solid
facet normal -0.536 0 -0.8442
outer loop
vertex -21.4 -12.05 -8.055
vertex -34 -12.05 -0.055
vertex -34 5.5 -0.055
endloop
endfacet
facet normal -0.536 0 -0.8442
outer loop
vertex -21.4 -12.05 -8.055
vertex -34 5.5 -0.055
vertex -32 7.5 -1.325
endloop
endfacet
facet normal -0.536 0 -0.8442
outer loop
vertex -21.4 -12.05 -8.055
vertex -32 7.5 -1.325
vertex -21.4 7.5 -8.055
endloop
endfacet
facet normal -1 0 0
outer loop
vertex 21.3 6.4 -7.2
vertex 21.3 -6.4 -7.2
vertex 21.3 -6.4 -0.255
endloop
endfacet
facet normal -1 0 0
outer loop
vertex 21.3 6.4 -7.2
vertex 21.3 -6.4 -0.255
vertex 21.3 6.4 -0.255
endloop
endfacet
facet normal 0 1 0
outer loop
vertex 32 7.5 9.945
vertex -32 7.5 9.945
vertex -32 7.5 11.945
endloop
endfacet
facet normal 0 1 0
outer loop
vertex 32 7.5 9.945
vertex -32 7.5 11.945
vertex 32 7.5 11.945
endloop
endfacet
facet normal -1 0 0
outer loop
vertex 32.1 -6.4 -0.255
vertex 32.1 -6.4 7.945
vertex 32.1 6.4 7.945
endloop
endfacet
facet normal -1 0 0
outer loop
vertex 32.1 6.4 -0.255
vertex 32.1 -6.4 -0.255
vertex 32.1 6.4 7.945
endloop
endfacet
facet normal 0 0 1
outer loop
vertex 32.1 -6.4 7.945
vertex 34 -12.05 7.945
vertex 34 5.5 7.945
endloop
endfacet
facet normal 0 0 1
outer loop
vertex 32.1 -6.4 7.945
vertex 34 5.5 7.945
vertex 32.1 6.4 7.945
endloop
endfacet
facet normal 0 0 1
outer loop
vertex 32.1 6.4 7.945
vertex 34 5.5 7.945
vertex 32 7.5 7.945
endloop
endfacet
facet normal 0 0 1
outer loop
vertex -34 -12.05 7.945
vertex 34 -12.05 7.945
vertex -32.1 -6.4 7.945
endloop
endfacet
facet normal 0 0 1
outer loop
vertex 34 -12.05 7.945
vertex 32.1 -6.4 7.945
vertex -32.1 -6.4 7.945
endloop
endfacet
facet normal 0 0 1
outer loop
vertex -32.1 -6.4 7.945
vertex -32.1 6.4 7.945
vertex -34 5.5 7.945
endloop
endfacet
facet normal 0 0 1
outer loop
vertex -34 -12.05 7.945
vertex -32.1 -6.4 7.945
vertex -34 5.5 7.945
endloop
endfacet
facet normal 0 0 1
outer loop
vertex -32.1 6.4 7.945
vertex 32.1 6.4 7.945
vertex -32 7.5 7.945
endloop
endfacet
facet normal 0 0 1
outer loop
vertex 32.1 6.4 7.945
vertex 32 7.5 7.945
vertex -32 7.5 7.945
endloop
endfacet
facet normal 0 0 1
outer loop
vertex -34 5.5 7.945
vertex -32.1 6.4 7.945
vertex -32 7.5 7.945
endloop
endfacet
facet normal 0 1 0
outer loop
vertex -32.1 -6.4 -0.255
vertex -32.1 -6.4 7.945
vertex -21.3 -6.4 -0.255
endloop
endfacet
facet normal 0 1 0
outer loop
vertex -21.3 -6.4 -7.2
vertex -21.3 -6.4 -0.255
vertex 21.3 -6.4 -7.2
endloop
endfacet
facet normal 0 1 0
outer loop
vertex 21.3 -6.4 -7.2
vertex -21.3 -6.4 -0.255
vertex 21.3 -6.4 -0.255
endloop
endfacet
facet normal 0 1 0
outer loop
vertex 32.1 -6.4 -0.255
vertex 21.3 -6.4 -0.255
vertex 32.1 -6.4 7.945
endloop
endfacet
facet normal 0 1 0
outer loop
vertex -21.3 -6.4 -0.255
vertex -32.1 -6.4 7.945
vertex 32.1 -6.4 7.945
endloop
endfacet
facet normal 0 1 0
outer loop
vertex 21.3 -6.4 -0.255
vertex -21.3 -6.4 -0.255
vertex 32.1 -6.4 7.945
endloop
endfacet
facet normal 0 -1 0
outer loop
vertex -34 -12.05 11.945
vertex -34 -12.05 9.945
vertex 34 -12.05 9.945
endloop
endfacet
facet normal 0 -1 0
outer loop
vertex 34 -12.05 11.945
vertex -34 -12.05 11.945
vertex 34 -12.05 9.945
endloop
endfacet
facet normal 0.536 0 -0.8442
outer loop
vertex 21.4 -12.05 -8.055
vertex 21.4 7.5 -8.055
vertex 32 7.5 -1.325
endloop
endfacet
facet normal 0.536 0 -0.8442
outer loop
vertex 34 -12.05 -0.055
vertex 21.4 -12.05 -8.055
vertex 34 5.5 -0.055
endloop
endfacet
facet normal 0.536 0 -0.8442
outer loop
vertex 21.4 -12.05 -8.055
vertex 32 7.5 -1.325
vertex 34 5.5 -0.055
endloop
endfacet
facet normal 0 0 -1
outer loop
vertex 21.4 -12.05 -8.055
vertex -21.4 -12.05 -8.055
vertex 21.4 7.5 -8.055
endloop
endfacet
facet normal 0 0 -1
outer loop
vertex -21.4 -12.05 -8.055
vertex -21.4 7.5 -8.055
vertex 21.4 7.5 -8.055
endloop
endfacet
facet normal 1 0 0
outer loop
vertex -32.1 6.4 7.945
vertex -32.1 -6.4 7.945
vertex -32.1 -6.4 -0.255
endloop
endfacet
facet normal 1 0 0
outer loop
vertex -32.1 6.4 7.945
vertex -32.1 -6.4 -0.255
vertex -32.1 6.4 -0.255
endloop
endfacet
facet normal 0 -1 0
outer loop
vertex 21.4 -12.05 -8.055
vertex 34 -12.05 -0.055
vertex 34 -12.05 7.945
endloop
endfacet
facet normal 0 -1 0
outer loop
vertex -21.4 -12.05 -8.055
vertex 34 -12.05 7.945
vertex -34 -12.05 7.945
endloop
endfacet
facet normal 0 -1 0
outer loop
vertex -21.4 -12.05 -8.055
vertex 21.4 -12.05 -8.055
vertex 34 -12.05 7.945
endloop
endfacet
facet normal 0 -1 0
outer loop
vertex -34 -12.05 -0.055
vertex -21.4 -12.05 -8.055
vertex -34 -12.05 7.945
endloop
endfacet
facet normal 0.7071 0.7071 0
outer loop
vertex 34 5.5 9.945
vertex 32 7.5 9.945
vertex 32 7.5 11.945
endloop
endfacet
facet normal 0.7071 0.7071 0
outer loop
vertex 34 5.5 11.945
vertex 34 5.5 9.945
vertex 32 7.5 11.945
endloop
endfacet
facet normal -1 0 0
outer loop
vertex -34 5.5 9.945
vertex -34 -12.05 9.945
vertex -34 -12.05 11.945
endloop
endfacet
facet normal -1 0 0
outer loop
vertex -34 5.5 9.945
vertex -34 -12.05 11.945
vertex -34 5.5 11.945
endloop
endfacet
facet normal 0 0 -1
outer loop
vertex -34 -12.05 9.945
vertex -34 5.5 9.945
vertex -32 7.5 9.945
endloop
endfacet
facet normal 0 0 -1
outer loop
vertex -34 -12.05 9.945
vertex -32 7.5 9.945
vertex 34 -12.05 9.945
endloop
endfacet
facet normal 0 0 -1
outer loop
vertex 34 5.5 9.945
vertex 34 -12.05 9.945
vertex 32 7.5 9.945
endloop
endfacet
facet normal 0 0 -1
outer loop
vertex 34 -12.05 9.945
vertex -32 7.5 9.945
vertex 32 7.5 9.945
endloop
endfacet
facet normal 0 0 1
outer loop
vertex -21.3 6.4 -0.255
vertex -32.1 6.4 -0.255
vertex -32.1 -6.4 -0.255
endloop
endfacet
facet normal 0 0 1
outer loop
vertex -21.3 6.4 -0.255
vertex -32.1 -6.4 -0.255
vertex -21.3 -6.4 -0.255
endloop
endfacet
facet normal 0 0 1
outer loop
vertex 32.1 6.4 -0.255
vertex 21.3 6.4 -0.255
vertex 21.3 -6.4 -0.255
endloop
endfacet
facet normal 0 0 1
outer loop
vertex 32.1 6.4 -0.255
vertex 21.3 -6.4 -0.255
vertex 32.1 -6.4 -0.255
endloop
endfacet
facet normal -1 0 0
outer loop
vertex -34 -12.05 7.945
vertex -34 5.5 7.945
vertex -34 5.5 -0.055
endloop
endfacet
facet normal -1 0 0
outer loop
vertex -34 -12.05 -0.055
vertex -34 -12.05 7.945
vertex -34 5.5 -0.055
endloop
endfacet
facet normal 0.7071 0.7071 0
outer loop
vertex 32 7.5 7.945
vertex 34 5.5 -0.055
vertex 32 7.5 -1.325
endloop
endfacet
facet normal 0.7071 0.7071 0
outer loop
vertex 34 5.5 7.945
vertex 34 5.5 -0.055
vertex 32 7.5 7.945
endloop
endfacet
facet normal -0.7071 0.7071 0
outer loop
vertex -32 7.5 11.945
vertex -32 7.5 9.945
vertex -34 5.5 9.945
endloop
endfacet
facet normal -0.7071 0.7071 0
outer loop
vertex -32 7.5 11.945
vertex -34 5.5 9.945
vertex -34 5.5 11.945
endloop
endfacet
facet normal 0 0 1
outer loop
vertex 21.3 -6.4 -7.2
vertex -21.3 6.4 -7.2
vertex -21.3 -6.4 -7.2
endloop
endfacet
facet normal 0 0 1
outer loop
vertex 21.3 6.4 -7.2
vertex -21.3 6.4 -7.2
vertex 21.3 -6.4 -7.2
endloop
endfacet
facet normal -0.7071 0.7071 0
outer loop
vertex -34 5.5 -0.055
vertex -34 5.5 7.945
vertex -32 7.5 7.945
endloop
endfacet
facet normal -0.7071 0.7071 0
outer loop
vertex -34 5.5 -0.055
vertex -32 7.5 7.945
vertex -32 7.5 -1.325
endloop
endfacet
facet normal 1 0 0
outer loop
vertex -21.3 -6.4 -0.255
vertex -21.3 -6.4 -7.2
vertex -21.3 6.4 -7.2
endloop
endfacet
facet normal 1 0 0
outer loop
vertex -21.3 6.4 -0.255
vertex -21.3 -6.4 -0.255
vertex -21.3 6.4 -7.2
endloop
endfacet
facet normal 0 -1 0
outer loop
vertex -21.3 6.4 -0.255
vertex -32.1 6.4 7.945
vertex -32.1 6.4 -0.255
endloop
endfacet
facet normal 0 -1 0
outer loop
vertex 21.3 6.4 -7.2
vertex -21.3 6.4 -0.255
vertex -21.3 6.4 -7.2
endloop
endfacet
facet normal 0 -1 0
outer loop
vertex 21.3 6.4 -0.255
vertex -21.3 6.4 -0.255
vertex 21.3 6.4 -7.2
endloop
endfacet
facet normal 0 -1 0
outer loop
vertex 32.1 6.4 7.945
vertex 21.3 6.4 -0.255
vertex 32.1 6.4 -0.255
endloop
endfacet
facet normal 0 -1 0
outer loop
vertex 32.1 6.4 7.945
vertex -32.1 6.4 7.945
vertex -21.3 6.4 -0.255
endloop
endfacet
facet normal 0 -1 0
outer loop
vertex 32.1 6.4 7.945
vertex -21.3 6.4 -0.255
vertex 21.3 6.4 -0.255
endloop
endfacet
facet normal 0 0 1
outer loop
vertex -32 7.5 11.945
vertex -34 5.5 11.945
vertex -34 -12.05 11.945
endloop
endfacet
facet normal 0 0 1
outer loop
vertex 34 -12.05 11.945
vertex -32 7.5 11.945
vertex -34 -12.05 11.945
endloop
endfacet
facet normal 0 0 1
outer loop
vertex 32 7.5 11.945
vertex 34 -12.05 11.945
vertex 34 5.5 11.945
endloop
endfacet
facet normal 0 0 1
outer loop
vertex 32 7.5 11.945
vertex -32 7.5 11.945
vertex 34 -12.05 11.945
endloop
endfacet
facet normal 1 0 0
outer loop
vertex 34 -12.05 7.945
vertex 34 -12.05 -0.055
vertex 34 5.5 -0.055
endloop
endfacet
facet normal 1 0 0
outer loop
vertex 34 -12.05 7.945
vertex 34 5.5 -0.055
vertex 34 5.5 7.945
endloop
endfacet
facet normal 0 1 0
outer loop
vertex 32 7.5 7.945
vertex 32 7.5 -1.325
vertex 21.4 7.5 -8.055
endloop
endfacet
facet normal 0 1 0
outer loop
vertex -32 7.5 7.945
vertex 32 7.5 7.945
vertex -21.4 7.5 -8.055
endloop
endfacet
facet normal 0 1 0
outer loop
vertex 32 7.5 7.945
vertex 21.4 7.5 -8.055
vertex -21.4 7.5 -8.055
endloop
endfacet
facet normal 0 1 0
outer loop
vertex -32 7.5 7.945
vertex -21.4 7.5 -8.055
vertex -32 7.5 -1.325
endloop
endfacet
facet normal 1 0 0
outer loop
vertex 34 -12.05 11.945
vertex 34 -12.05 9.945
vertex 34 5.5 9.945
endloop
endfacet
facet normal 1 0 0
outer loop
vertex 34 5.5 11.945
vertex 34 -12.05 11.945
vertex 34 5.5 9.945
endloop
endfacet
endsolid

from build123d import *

# Parameters (mm, degrees)
BOSS_EXTRUDE1_DEPTH      = 7.5
BOSS_EXTRUDE1_DEPTH_BACK = 12.05
SKETCH1_W                = 42.6
SKETCH1_H                = 12.8
CUT_EXTRUDE1_DEPTH       = 7.2
SKETCH1_2_W              = 42.6
SKETCH1_2_H              = 12.8
CUT_EXTRUDE2_DEPTH       = 37.960677854
SKETCH3_W                = 64.2
SKETCH3_H                = 12.8
CUT_EXTRUDE3_DEPTH       = 8.2
BOSS_EXTRUDE2_START      = 2
SKETCH4_W                = 68
SKETCH4_H                = 19.55
BOSS_EXTRUDE2_DEPTH      = 2
CHAMFER1_SIZE            = 2
CHAMFER2_SIZE            = 2


with BuildPart() as part:
    # Sketch2 → Boss-Extrude1 (new, two sides: drawn at the far end of the back side and taken through both)
    with BuildSketch(Plane(origin=(0, 0, 0), x_dir=(1, 0, 0), z_dir=(0, 1, 0)).offset(-BOSS_EXTRUDE1_DEPTH_BACK)):
        Polygon((-34, 0.055383753), (-21.4, 8.055383753), (21.4, 8.055383753), (34, 0.055383753), (34, -7.944616247), (-34, -7.944616247), align=None)
    extrude(amount=BOSS_EXTRUDE1_DEPTH + BOSS_EXTRUDE1_DEPTH_BACK)

    # Sketch1 → Cut-Extrude1 (cut)
    with BuildSketch(Plane.XY):
        Rectangle(SKETCH1_W, SKETCH1_H)
    extrude(amount=-CUT_EXTRUDE1_DEPTH, mode=Mode.SUBTRACT)

    # Sketch1<2> → Cut-Extrude2 (cut, through all)
    with BuildSketch(Plane.XY):
        Rectangle(SKETCH1_2_W, SKETCH1_2_H)
    extrude(amount=CUT_EXTRUDE2_DEPTH, mode=Mode.SUBTRACT)

    # Sketch3 → Cut-Extrude3 (cut)
    with BuildSketch(Plane.XY.offset(7.944616247)):
        Rectangle(SKETCH3_W, SKETCH3_H)
    extrude(amount=-CUT_EXTRUDE3_DEPTH, mode=Mode.SUBTRACT)

    # Chamfer1
    chamfer1_edges = [part.edges().sort_by_distance(p)[0] for p in [
        (34, 7.5, 3.944616247),
        (-34, 7.5, 3.944616247),
    ]]
    chamfer(chamfer1_edges, length=CHAMFER1_SIZE)


with BuildPart() as body_2:
    # Sketch4 → Boss-Extrude2 (new body)
    with BuildSketch(Plane.XY.offset(7.944616247).offset(BOSS_EXTRUDE2_START)):
        with Locations((0, -2.275)):
            Rectangle(SKETCH4_W, SKETCH4_H)
    extrude(amount=BOSS_EXTRUDE2_DEPTH)

    # Chamfer2
    chamfer2_edges = [body_2.edges().sort_by_distance(p)[0] for p in [
        (34, 7.5, 10.944616247),
        (-34, 7.5, 10.944616247),
    ]]
    chamfer(chamfer2_edges, length=CHAMFER2_SIZE)


solid = Compound([part.part, body_2.part])
